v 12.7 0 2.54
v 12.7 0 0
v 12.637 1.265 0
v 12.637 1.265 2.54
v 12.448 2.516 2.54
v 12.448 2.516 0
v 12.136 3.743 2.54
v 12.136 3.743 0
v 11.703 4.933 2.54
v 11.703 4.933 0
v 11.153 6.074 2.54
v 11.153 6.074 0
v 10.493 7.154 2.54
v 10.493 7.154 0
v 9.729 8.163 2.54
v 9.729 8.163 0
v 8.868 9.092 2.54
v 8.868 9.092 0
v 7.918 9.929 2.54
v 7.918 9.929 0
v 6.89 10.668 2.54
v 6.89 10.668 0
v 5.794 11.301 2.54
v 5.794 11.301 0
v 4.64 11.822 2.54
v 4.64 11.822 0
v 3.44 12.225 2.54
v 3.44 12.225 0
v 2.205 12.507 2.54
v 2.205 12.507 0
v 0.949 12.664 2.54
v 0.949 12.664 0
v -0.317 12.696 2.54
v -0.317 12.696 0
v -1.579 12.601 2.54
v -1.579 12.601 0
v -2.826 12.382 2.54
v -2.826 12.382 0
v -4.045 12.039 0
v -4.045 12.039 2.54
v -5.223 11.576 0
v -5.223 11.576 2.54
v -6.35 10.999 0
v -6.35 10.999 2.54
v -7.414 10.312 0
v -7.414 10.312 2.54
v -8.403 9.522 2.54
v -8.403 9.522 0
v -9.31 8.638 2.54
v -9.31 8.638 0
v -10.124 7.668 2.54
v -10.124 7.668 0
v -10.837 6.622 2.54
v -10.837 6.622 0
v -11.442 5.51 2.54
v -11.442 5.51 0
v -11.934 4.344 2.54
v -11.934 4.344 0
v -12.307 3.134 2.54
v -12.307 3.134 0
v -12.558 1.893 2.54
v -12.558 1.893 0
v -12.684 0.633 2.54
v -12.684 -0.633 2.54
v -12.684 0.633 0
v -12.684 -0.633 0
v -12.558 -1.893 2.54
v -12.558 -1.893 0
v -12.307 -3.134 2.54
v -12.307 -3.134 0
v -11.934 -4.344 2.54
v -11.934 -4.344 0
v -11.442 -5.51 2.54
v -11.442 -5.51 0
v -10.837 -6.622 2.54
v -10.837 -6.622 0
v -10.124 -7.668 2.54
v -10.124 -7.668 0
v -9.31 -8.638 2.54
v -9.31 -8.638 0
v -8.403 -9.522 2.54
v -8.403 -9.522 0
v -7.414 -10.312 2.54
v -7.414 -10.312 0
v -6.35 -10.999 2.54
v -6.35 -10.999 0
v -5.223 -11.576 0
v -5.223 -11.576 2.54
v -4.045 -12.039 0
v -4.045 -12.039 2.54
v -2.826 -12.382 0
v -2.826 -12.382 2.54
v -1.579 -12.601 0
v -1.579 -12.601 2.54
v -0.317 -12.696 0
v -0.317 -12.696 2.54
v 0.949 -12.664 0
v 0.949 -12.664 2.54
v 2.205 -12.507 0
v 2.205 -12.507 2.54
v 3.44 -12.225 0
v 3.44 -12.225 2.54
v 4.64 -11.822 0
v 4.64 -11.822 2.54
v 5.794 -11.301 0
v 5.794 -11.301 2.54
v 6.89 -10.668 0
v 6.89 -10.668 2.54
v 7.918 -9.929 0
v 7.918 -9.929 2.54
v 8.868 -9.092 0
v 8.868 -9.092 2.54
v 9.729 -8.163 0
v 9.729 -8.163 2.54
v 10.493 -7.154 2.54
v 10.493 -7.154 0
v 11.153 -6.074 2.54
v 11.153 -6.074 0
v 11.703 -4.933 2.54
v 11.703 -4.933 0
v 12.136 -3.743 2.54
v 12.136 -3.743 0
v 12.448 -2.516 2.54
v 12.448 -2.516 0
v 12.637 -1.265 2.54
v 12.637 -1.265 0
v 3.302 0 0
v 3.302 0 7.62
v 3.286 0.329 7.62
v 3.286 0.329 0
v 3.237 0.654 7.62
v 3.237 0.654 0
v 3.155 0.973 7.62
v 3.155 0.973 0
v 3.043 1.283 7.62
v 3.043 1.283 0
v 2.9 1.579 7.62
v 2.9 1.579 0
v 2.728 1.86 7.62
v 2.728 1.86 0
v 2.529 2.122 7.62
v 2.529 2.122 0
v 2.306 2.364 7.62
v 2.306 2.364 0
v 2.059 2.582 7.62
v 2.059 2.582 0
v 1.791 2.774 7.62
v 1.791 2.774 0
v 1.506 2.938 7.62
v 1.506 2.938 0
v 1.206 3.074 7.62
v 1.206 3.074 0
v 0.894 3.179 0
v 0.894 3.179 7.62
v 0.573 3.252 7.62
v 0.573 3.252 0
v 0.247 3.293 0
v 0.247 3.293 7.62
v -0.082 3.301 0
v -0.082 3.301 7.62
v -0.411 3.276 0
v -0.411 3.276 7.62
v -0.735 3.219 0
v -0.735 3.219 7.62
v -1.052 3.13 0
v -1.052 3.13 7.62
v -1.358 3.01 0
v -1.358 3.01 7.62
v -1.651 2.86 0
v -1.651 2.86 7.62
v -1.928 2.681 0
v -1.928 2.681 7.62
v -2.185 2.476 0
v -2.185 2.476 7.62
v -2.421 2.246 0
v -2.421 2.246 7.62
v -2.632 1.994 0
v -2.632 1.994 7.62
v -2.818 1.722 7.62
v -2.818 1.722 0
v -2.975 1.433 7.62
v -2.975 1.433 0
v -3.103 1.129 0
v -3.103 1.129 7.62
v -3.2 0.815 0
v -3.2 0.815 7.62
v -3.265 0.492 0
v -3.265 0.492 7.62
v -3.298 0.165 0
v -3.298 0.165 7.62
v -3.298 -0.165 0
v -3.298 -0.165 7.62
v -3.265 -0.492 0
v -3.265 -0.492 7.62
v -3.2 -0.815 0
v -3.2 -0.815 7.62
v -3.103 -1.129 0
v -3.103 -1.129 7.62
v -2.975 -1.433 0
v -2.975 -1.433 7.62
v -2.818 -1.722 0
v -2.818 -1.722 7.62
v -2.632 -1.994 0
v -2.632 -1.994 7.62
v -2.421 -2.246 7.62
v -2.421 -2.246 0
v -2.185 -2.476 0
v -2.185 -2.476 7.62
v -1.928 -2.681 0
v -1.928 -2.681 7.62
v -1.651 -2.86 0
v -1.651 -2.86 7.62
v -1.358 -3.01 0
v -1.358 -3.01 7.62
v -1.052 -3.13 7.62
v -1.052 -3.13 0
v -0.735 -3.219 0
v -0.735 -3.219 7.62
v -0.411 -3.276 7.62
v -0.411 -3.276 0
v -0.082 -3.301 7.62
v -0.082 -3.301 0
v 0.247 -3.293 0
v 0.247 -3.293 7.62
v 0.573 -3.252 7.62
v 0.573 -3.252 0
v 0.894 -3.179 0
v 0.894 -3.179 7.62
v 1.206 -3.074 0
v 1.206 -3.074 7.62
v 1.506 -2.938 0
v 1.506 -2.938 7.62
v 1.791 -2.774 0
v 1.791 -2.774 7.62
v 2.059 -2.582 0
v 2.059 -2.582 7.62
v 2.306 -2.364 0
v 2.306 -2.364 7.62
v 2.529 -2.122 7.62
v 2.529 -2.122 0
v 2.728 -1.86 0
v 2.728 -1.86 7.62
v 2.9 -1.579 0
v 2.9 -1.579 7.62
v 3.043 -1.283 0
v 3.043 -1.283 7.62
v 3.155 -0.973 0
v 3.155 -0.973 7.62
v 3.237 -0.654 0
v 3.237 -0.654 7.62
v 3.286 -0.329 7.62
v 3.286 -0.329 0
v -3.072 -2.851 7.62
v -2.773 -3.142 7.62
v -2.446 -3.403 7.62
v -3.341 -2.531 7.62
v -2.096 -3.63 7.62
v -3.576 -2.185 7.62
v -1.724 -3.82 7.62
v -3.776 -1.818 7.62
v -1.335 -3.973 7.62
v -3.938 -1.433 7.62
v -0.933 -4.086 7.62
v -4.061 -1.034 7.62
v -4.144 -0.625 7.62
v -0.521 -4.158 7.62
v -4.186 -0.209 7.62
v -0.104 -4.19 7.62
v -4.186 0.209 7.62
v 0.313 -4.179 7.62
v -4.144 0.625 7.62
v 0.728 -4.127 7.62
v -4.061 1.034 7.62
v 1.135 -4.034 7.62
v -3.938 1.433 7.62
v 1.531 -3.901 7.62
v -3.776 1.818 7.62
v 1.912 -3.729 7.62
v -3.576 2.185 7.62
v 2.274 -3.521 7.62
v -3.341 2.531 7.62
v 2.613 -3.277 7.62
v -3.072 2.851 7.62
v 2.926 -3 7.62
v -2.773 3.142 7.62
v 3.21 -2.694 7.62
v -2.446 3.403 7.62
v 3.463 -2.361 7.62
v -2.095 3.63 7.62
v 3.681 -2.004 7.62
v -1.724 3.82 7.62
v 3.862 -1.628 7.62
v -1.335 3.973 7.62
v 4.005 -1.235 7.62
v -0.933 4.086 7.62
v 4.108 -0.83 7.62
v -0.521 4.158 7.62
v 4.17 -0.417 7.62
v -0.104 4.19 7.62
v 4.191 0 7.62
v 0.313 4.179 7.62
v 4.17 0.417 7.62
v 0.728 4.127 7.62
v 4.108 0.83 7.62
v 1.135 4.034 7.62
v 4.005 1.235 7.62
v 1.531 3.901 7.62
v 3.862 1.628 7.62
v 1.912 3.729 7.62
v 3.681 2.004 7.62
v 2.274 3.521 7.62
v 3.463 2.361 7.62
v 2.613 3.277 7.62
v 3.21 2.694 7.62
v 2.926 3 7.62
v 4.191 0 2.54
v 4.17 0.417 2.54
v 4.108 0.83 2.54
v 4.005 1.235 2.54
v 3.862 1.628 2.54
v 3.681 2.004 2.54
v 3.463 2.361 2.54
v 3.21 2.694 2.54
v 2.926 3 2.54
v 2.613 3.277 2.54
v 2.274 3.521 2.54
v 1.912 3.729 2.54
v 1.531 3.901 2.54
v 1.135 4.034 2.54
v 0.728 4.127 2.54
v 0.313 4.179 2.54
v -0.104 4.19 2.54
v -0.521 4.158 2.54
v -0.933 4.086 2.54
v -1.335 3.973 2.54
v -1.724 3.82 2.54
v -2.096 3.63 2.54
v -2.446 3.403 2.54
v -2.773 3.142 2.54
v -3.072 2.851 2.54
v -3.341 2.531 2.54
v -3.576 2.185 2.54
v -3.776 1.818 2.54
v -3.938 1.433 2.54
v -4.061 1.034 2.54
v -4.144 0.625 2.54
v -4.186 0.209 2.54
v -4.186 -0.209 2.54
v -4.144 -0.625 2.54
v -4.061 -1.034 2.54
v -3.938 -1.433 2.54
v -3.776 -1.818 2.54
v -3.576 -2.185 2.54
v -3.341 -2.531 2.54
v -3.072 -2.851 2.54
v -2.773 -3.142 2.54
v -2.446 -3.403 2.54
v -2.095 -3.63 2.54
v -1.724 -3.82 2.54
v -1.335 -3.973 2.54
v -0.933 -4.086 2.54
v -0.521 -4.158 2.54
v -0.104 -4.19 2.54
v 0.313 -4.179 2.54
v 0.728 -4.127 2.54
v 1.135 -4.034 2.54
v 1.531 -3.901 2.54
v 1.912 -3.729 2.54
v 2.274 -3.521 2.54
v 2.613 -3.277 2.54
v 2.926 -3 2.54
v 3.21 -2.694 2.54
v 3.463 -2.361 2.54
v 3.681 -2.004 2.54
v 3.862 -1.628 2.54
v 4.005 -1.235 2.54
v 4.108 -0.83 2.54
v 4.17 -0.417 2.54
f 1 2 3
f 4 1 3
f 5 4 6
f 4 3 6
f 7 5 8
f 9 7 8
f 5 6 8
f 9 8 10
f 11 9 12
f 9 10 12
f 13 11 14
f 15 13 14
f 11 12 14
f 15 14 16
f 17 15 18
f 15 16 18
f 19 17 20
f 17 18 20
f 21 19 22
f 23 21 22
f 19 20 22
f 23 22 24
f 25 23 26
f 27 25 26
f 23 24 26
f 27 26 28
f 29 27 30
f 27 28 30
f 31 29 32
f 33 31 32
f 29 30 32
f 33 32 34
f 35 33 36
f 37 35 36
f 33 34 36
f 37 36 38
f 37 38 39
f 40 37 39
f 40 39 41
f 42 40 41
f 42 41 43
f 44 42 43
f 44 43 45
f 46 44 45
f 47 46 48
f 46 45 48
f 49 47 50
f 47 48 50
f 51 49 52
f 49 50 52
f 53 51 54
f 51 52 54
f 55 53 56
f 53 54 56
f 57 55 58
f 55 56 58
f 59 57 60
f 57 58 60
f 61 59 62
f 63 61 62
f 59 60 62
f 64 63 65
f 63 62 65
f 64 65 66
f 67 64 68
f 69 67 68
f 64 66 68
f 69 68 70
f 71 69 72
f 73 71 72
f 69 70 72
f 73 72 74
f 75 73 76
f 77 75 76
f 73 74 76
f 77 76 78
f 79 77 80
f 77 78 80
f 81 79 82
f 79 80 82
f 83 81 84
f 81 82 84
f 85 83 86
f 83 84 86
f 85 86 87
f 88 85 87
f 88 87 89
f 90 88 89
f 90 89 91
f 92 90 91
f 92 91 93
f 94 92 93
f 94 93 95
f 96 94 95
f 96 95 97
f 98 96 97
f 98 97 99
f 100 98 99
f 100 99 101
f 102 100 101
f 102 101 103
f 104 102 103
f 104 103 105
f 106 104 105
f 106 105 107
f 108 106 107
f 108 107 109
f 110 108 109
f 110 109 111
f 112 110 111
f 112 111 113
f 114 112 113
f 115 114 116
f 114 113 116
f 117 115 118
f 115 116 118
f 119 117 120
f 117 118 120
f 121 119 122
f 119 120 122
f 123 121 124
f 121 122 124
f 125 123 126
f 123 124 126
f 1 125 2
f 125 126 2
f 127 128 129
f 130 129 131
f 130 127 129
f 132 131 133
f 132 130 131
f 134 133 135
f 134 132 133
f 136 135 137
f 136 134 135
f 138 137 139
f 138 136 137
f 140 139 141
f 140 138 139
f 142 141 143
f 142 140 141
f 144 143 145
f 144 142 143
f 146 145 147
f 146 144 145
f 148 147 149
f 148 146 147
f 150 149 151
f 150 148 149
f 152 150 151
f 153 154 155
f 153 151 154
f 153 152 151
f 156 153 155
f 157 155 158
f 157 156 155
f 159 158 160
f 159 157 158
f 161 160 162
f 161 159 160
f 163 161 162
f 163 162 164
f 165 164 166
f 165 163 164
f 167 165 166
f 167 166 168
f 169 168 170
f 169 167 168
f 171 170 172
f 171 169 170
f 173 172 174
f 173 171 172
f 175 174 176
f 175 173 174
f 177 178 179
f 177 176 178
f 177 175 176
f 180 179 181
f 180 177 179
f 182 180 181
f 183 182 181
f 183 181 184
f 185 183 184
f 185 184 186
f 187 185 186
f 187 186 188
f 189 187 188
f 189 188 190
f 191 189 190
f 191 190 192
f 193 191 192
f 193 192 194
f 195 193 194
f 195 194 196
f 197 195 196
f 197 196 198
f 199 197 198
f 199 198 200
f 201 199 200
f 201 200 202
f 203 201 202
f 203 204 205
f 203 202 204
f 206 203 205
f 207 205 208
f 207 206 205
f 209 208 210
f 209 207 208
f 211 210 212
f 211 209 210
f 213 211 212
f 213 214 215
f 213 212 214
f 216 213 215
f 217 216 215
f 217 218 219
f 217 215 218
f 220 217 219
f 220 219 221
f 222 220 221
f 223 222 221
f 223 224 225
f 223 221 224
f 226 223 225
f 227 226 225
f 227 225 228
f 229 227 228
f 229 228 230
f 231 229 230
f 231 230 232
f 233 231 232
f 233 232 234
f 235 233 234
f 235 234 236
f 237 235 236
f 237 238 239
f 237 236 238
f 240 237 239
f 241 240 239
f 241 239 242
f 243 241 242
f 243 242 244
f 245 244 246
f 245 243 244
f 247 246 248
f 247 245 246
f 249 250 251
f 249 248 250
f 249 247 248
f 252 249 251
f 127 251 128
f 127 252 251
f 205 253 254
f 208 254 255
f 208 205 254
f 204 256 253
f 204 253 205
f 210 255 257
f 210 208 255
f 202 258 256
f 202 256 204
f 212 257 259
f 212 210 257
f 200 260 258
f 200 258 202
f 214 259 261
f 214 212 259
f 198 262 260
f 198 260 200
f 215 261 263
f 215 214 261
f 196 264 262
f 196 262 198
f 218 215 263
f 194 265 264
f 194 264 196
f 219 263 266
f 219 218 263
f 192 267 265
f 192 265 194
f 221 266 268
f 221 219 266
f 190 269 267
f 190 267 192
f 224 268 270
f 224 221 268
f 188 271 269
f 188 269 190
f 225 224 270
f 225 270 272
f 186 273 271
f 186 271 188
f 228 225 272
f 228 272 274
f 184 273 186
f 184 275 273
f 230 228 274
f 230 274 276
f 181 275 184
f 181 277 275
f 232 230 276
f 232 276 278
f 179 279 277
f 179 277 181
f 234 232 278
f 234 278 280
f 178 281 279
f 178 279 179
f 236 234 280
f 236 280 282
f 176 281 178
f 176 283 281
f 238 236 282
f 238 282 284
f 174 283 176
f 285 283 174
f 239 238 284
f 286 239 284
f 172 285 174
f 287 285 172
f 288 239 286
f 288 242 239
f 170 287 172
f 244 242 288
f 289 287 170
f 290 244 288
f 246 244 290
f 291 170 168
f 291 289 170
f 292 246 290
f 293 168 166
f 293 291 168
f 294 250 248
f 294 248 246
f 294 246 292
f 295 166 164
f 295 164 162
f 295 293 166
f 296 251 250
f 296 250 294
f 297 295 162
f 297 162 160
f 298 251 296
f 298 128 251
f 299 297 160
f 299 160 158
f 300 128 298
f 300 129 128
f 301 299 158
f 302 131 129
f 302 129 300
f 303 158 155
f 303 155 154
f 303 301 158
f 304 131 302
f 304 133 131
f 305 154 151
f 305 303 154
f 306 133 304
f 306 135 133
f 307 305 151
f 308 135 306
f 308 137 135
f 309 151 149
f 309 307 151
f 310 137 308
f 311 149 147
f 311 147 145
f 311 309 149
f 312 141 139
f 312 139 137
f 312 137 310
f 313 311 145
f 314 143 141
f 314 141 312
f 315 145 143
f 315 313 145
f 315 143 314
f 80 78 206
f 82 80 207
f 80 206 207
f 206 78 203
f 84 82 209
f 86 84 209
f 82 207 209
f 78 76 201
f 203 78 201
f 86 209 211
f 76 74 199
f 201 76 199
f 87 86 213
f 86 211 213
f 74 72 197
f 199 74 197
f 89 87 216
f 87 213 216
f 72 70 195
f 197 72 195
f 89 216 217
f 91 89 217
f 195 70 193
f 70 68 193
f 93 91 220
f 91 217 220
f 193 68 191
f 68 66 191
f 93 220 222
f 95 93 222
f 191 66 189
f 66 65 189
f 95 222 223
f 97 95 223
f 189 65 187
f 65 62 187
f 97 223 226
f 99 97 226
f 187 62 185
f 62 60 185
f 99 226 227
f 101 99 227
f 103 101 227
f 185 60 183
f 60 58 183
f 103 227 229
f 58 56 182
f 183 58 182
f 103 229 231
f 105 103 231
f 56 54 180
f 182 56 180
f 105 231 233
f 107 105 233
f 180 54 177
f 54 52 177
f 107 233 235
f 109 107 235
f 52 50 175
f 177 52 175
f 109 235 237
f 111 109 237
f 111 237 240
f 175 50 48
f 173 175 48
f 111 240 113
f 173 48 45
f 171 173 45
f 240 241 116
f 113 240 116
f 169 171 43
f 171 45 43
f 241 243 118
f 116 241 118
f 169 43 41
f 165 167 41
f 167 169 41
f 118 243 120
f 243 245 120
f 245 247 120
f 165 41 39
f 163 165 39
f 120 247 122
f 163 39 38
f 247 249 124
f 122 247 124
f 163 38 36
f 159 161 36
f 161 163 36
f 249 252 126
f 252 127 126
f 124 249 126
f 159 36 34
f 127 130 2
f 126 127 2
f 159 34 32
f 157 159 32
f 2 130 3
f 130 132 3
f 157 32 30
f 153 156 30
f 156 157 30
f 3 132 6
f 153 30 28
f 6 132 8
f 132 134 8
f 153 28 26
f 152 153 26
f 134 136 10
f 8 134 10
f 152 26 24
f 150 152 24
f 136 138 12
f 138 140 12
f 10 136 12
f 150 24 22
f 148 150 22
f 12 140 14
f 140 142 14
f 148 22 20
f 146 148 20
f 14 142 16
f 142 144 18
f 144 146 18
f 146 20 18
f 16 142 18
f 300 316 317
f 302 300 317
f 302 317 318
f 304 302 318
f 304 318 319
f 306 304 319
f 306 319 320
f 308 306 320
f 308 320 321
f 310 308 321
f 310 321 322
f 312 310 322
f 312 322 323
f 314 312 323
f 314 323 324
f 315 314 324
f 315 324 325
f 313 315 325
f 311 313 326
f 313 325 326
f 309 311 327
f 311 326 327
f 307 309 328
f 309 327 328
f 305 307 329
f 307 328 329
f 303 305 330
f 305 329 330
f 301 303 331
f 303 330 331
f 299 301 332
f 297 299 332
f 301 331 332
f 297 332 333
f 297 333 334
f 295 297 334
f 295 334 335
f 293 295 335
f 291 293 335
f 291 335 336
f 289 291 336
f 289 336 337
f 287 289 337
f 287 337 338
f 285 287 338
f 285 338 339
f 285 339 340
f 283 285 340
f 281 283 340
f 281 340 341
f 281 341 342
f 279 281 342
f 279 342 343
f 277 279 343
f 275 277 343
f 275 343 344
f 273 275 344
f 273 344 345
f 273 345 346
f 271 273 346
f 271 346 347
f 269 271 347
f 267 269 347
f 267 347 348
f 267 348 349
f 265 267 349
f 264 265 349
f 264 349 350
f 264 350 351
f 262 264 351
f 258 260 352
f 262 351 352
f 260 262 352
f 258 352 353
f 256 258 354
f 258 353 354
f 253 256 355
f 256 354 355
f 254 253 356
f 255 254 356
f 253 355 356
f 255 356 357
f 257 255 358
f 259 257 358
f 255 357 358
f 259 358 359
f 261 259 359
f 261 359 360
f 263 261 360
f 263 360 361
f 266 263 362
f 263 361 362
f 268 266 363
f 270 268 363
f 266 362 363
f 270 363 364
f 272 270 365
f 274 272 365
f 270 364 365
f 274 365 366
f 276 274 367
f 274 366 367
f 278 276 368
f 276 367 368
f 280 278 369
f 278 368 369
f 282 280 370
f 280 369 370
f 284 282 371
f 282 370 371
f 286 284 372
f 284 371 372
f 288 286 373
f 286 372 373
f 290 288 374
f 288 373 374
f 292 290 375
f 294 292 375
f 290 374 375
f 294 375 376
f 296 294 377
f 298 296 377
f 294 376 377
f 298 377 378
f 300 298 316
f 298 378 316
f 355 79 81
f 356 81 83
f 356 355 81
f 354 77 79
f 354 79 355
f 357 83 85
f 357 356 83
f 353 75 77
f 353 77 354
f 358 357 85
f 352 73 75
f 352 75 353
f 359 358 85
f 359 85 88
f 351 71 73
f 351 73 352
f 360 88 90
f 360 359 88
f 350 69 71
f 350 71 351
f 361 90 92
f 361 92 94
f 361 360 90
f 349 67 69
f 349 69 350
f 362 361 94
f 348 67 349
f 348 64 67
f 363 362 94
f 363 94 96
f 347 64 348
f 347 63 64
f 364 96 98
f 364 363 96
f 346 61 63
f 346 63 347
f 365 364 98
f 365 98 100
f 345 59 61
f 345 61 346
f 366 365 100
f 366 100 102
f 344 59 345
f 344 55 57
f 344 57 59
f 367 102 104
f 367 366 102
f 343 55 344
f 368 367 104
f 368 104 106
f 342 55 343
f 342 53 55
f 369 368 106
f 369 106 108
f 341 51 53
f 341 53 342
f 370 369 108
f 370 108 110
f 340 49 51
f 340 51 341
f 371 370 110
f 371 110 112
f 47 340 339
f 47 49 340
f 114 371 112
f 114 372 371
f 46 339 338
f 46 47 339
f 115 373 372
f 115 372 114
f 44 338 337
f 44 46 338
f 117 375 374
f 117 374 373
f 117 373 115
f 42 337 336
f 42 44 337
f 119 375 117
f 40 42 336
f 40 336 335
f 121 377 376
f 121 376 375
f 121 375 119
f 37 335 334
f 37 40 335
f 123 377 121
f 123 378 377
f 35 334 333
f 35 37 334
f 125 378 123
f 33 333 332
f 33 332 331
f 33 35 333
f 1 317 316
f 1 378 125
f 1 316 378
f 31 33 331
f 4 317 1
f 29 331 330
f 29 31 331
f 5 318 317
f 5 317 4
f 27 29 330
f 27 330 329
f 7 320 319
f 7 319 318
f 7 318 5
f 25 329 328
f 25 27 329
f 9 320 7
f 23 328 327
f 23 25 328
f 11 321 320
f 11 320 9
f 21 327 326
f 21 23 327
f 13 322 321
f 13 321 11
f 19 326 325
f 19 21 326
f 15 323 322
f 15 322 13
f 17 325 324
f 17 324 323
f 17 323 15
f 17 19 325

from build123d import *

# Parameters (mm, degrees)
F0_R     = 12.7
F1_DEPTH = 2.54
F2_R     = 4.191
F3_DEPTH = 7.62
F4_R     = 3.302
F5_DEPTH = 7.621


with BuildPart() as f1:
    # F0 (on Top) → F1 (new body)
    with BuildSketch(Plane.XY):
        Circle(F0_R)
    extrude(amount=F1_DEPTH)

    # F2 (on Top) → F3 (join)
    with BuildSketch(Plane.XY):
        Circle(F2_R)
    extrude(amount=F3_DEPTH)

    # F4 (on Top) → F5 (cut, through all)
    with BuildSketch(Plane.XY):
        Circle(F4_R)
    extrude(amount=F5_DEPTH, mode=Mode.SUBTRACT)


solid = f1.part
